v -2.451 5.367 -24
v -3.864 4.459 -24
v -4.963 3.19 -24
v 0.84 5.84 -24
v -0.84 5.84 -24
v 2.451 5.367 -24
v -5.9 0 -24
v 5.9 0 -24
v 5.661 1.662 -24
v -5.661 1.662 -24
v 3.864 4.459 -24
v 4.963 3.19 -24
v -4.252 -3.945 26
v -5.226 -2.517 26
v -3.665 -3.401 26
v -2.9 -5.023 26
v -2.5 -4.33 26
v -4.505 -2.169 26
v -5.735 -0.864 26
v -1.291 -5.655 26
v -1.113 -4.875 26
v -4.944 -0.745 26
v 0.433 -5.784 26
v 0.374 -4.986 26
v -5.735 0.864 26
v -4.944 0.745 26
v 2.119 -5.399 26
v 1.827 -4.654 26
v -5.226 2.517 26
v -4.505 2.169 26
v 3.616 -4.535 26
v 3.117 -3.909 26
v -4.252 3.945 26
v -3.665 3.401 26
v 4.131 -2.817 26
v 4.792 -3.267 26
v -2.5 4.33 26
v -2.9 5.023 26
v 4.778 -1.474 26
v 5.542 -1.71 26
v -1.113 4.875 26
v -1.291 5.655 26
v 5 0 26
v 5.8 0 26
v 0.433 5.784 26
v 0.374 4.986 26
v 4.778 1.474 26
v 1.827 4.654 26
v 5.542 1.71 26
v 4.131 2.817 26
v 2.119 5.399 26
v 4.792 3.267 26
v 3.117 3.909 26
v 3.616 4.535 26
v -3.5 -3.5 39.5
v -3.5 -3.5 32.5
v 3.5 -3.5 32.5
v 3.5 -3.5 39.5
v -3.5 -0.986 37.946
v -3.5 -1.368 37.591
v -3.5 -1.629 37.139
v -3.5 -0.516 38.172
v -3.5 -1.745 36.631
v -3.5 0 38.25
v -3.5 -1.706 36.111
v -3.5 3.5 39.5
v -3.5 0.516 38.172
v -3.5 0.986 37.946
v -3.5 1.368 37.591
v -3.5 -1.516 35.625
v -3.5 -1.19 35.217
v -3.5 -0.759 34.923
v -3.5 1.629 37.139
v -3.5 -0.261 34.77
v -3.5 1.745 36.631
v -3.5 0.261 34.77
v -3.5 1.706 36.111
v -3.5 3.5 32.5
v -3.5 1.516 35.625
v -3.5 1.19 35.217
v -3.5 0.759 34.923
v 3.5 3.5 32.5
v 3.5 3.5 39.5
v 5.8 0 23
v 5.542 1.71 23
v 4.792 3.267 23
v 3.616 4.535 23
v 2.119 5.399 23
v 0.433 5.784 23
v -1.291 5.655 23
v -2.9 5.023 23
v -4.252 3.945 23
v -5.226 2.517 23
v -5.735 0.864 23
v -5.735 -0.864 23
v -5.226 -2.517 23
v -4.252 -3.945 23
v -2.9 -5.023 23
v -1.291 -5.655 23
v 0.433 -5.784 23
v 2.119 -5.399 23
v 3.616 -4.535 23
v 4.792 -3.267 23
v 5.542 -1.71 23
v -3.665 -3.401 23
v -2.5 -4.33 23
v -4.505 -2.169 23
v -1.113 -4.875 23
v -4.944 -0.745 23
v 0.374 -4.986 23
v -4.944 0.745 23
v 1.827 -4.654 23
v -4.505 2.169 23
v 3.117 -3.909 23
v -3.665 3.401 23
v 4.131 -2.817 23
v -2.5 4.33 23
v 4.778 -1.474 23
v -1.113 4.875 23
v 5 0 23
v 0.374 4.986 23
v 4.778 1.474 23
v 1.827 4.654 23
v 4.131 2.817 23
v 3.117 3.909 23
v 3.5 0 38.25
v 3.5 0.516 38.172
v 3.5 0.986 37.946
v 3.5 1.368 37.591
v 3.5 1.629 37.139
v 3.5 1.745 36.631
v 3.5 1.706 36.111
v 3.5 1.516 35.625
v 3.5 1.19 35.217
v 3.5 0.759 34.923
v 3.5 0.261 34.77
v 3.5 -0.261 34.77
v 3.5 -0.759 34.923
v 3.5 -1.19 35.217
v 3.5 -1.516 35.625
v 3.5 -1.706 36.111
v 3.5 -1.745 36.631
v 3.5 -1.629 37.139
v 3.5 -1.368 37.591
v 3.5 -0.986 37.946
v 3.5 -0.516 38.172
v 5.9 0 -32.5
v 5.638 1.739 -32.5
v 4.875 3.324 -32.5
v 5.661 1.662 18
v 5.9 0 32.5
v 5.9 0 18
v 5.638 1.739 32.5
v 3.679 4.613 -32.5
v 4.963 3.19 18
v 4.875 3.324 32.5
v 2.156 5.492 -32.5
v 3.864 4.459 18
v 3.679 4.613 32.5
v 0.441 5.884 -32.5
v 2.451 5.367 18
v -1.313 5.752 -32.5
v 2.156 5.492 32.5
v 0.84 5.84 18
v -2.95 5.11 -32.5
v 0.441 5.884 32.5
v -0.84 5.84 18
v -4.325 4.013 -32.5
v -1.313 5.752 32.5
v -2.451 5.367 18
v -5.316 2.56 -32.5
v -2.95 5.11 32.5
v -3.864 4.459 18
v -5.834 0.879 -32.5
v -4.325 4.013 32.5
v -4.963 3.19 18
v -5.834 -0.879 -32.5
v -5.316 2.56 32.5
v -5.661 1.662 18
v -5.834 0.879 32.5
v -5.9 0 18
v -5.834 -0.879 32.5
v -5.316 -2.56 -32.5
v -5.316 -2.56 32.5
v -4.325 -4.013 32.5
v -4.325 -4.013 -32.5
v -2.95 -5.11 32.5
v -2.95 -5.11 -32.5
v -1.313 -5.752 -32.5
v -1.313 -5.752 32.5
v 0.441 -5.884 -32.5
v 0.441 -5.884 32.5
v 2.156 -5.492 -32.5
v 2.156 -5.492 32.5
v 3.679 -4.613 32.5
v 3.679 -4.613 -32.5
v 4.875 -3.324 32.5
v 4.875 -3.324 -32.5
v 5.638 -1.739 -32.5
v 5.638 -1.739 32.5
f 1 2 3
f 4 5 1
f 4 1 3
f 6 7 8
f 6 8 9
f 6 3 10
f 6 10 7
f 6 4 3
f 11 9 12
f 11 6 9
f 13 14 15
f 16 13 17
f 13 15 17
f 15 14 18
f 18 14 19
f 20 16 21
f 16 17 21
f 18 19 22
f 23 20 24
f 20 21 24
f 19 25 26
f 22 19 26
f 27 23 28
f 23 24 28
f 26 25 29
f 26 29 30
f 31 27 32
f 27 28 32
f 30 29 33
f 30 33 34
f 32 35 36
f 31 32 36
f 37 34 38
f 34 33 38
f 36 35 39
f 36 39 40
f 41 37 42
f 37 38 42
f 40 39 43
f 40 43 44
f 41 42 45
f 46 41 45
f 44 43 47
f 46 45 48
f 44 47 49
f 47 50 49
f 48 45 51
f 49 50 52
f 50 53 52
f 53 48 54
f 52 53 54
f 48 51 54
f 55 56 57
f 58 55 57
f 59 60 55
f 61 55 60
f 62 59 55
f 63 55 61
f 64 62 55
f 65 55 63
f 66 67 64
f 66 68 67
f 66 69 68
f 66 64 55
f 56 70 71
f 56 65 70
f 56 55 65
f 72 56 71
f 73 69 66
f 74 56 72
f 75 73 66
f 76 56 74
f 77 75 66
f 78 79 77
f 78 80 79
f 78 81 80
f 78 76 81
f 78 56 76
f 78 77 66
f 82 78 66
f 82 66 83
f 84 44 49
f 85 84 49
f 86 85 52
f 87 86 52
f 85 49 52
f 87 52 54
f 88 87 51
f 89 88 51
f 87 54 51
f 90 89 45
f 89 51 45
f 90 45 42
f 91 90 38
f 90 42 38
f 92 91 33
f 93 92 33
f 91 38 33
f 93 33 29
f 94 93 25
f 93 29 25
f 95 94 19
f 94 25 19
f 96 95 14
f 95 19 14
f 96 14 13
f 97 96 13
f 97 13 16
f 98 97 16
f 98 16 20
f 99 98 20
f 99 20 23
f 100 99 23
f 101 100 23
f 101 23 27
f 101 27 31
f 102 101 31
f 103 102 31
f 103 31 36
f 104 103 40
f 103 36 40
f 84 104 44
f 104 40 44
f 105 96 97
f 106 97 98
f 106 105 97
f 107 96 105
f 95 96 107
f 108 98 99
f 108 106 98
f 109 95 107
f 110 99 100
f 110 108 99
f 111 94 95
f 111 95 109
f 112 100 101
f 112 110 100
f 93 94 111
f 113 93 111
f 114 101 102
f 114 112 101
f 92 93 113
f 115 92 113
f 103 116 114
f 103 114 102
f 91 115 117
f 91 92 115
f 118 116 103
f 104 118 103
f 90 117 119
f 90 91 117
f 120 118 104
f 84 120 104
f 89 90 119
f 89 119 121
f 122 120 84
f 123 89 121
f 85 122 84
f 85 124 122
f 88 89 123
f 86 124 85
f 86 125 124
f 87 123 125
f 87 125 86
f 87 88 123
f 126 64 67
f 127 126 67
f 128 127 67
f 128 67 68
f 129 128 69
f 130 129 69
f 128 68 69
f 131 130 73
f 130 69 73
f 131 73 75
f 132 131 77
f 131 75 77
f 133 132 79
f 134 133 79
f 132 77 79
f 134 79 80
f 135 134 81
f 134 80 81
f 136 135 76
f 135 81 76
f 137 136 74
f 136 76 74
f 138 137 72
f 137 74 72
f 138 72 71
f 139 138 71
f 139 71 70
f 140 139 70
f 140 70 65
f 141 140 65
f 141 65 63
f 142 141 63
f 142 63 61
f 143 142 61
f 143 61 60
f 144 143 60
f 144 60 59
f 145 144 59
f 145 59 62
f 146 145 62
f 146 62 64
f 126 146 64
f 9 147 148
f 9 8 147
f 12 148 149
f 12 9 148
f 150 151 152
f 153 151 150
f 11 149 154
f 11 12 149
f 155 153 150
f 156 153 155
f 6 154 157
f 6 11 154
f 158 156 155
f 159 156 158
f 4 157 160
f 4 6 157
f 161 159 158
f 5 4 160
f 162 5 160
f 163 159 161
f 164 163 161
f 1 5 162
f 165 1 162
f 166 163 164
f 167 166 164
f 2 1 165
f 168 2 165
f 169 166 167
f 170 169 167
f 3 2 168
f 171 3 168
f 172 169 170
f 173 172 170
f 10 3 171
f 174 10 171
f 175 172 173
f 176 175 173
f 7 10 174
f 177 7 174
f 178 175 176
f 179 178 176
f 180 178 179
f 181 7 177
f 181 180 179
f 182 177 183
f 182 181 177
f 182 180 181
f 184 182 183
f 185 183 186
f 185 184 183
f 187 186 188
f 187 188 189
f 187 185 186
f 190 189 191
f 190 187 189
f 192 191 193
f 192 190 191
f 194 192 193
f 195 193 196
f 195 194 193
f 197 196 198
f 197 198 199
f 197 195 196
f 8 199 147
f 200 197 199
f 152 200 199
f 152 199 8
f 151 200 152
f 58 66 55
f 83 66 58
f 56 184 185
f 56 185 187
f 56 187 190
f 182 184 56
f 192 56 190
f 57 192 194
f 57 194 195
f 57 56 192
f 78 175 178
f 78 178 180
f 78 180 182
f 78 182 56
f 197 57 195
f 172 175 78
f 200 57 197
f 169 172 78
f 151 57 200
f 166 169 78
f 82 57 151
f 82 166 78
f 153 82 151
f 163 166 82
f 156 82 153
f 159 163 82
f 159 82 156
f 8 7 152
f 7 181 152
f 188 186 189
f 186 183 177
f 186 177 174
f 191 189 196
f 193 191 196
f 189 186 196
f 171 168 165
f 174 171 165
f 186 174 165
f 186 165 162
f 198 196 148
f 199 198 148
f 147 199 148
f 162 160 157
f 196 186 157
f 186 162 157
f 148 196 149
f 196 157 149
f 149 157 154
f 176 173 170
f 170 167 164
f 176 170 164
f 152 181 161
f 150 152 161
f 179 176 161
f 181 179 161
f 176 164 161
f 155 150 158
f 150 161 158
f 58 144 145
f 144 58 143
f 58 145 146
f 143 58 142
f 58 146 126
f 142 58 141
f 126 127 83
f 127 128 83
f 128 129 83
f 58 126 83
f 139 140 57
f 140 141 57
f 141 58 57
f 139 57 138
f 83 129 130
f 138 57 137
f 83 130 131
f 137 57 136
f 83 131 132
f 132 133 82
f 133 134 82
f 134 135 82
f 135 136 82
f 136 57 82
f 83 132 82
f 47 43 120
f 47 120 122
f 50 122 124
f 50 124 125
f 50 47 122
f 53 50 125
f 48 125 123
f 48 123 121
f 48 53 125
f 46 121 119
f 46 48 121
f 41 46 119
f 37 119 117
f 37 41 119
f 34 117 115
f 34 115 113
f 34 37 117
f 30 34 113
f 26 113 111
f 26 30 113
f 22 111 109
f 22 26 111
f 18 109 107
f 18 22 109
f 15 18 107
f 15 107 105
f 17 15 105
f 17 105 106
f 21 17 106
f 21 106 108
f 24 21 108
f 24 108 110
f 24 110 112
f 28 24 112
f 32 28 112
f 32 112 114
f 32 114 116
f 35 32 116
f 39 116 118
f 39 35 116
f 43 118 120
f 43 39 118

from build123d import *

# Parameters (mm, degrees)
CROQUIS1_R                   = 5.9
SALIENTE_EXTRUIR1_DEPTH      = 32.5
CORTAR_EXTRUIR1_DEPTH        = 24
CORTAR_EXTRUIR_L_MINA1_START = -6.5
CROQUIS3_R                   = 5.8
CROQUIS3_R_2                 = 5
CORTAR_EXTRUIR_L_MINA1_DEPTH = 3
CROQUIS4_W                   = 7
CROQUIS4_H                   = 7
SALIENTE_EXTRUIR2_DEPTH      = 7
CROQUIS6_R                   = 1.75
CORTAR_EXTRUIR3_DEPTH        = 42.029501581
CORTAR_EXTRUIR4_START        = 18
CORTAR_EXTRUIR4_DEPTH        = 18


with BuildPart() as part:
    # Croquis1 → Saliente-Extruir1 (new, symmetric)
    with BuildSketch(Plane.XY):
        Circle(CROQUIS1_R)
    extrude(amount=SALIENTE_EXTRUIR1_DEPTH, both=True)

    # Croquis2 → Cortar-Extruir1 (cut)
    with BuildSketch(Plane.XY):
        with BuildLine():
            Line((-5.9, 0), (5.9, 0))
            ThreePointArc((5.9, 0), (0, 5.9), (-5.9, 0))
        make_face()
    extrude(amount=-CORTAR_EXTRUIR1_DEPTH, mode=Mode.SUBTRACT)

    # Croquis3 → Cortar-Extruir-Lámina1 (cut)
    with BuildSketch(Plane.XY.offset(32.5).offset(CORTAR_EXTRUIR_L_MINA1_START)):
        Circle(CROQUIS3_R)
        Circle(CROQUIS3_R_2, mode=Mode.SUBTRACT)
    extrude(amount=-CORTAR_EXTRUIR_L_MINA1_DEPTH, mode=Mode.SUBTRACT)

    # Croquis4 → Saliente-Extruir2 (add)
    with BuildSketch(Plane.XY.offset(32.5)):
        Rectangle(CROQUIS4_W, CROQUIS4_H)
    extrude(amount=SALIENTE_EXTRUIR2_DEPTH)

    # Croquis6 → Cortar-Extruir3 (cut, through all)
    with BuildSketch(Plane.ZY.offset(3.5)):
        with Locations((36.5, 0)):
            Circle(CROQUIS6_R)
    extrude(amount=-CORTAR_EXTRUIR3_DEPTH, mode=Mode.SUBTRACT)

    # Croquis2<2> → Cortar-Extruir4 (cut)
    with BuildSketch(Plane.XY.offset(CORTAR_EXTRUIR4_START)):
        with BuildLine():
            Line((-5.9, 0), (5.9, 0))
            ThreePointArc((5.9, 0), (0, 5.9), (-5.9, 0))
        make_face()
    extrude(amount=-CORTAR_EXTRUIR4_DEPTH, mode=Mode.SUBTRACT)


solid = part.part
